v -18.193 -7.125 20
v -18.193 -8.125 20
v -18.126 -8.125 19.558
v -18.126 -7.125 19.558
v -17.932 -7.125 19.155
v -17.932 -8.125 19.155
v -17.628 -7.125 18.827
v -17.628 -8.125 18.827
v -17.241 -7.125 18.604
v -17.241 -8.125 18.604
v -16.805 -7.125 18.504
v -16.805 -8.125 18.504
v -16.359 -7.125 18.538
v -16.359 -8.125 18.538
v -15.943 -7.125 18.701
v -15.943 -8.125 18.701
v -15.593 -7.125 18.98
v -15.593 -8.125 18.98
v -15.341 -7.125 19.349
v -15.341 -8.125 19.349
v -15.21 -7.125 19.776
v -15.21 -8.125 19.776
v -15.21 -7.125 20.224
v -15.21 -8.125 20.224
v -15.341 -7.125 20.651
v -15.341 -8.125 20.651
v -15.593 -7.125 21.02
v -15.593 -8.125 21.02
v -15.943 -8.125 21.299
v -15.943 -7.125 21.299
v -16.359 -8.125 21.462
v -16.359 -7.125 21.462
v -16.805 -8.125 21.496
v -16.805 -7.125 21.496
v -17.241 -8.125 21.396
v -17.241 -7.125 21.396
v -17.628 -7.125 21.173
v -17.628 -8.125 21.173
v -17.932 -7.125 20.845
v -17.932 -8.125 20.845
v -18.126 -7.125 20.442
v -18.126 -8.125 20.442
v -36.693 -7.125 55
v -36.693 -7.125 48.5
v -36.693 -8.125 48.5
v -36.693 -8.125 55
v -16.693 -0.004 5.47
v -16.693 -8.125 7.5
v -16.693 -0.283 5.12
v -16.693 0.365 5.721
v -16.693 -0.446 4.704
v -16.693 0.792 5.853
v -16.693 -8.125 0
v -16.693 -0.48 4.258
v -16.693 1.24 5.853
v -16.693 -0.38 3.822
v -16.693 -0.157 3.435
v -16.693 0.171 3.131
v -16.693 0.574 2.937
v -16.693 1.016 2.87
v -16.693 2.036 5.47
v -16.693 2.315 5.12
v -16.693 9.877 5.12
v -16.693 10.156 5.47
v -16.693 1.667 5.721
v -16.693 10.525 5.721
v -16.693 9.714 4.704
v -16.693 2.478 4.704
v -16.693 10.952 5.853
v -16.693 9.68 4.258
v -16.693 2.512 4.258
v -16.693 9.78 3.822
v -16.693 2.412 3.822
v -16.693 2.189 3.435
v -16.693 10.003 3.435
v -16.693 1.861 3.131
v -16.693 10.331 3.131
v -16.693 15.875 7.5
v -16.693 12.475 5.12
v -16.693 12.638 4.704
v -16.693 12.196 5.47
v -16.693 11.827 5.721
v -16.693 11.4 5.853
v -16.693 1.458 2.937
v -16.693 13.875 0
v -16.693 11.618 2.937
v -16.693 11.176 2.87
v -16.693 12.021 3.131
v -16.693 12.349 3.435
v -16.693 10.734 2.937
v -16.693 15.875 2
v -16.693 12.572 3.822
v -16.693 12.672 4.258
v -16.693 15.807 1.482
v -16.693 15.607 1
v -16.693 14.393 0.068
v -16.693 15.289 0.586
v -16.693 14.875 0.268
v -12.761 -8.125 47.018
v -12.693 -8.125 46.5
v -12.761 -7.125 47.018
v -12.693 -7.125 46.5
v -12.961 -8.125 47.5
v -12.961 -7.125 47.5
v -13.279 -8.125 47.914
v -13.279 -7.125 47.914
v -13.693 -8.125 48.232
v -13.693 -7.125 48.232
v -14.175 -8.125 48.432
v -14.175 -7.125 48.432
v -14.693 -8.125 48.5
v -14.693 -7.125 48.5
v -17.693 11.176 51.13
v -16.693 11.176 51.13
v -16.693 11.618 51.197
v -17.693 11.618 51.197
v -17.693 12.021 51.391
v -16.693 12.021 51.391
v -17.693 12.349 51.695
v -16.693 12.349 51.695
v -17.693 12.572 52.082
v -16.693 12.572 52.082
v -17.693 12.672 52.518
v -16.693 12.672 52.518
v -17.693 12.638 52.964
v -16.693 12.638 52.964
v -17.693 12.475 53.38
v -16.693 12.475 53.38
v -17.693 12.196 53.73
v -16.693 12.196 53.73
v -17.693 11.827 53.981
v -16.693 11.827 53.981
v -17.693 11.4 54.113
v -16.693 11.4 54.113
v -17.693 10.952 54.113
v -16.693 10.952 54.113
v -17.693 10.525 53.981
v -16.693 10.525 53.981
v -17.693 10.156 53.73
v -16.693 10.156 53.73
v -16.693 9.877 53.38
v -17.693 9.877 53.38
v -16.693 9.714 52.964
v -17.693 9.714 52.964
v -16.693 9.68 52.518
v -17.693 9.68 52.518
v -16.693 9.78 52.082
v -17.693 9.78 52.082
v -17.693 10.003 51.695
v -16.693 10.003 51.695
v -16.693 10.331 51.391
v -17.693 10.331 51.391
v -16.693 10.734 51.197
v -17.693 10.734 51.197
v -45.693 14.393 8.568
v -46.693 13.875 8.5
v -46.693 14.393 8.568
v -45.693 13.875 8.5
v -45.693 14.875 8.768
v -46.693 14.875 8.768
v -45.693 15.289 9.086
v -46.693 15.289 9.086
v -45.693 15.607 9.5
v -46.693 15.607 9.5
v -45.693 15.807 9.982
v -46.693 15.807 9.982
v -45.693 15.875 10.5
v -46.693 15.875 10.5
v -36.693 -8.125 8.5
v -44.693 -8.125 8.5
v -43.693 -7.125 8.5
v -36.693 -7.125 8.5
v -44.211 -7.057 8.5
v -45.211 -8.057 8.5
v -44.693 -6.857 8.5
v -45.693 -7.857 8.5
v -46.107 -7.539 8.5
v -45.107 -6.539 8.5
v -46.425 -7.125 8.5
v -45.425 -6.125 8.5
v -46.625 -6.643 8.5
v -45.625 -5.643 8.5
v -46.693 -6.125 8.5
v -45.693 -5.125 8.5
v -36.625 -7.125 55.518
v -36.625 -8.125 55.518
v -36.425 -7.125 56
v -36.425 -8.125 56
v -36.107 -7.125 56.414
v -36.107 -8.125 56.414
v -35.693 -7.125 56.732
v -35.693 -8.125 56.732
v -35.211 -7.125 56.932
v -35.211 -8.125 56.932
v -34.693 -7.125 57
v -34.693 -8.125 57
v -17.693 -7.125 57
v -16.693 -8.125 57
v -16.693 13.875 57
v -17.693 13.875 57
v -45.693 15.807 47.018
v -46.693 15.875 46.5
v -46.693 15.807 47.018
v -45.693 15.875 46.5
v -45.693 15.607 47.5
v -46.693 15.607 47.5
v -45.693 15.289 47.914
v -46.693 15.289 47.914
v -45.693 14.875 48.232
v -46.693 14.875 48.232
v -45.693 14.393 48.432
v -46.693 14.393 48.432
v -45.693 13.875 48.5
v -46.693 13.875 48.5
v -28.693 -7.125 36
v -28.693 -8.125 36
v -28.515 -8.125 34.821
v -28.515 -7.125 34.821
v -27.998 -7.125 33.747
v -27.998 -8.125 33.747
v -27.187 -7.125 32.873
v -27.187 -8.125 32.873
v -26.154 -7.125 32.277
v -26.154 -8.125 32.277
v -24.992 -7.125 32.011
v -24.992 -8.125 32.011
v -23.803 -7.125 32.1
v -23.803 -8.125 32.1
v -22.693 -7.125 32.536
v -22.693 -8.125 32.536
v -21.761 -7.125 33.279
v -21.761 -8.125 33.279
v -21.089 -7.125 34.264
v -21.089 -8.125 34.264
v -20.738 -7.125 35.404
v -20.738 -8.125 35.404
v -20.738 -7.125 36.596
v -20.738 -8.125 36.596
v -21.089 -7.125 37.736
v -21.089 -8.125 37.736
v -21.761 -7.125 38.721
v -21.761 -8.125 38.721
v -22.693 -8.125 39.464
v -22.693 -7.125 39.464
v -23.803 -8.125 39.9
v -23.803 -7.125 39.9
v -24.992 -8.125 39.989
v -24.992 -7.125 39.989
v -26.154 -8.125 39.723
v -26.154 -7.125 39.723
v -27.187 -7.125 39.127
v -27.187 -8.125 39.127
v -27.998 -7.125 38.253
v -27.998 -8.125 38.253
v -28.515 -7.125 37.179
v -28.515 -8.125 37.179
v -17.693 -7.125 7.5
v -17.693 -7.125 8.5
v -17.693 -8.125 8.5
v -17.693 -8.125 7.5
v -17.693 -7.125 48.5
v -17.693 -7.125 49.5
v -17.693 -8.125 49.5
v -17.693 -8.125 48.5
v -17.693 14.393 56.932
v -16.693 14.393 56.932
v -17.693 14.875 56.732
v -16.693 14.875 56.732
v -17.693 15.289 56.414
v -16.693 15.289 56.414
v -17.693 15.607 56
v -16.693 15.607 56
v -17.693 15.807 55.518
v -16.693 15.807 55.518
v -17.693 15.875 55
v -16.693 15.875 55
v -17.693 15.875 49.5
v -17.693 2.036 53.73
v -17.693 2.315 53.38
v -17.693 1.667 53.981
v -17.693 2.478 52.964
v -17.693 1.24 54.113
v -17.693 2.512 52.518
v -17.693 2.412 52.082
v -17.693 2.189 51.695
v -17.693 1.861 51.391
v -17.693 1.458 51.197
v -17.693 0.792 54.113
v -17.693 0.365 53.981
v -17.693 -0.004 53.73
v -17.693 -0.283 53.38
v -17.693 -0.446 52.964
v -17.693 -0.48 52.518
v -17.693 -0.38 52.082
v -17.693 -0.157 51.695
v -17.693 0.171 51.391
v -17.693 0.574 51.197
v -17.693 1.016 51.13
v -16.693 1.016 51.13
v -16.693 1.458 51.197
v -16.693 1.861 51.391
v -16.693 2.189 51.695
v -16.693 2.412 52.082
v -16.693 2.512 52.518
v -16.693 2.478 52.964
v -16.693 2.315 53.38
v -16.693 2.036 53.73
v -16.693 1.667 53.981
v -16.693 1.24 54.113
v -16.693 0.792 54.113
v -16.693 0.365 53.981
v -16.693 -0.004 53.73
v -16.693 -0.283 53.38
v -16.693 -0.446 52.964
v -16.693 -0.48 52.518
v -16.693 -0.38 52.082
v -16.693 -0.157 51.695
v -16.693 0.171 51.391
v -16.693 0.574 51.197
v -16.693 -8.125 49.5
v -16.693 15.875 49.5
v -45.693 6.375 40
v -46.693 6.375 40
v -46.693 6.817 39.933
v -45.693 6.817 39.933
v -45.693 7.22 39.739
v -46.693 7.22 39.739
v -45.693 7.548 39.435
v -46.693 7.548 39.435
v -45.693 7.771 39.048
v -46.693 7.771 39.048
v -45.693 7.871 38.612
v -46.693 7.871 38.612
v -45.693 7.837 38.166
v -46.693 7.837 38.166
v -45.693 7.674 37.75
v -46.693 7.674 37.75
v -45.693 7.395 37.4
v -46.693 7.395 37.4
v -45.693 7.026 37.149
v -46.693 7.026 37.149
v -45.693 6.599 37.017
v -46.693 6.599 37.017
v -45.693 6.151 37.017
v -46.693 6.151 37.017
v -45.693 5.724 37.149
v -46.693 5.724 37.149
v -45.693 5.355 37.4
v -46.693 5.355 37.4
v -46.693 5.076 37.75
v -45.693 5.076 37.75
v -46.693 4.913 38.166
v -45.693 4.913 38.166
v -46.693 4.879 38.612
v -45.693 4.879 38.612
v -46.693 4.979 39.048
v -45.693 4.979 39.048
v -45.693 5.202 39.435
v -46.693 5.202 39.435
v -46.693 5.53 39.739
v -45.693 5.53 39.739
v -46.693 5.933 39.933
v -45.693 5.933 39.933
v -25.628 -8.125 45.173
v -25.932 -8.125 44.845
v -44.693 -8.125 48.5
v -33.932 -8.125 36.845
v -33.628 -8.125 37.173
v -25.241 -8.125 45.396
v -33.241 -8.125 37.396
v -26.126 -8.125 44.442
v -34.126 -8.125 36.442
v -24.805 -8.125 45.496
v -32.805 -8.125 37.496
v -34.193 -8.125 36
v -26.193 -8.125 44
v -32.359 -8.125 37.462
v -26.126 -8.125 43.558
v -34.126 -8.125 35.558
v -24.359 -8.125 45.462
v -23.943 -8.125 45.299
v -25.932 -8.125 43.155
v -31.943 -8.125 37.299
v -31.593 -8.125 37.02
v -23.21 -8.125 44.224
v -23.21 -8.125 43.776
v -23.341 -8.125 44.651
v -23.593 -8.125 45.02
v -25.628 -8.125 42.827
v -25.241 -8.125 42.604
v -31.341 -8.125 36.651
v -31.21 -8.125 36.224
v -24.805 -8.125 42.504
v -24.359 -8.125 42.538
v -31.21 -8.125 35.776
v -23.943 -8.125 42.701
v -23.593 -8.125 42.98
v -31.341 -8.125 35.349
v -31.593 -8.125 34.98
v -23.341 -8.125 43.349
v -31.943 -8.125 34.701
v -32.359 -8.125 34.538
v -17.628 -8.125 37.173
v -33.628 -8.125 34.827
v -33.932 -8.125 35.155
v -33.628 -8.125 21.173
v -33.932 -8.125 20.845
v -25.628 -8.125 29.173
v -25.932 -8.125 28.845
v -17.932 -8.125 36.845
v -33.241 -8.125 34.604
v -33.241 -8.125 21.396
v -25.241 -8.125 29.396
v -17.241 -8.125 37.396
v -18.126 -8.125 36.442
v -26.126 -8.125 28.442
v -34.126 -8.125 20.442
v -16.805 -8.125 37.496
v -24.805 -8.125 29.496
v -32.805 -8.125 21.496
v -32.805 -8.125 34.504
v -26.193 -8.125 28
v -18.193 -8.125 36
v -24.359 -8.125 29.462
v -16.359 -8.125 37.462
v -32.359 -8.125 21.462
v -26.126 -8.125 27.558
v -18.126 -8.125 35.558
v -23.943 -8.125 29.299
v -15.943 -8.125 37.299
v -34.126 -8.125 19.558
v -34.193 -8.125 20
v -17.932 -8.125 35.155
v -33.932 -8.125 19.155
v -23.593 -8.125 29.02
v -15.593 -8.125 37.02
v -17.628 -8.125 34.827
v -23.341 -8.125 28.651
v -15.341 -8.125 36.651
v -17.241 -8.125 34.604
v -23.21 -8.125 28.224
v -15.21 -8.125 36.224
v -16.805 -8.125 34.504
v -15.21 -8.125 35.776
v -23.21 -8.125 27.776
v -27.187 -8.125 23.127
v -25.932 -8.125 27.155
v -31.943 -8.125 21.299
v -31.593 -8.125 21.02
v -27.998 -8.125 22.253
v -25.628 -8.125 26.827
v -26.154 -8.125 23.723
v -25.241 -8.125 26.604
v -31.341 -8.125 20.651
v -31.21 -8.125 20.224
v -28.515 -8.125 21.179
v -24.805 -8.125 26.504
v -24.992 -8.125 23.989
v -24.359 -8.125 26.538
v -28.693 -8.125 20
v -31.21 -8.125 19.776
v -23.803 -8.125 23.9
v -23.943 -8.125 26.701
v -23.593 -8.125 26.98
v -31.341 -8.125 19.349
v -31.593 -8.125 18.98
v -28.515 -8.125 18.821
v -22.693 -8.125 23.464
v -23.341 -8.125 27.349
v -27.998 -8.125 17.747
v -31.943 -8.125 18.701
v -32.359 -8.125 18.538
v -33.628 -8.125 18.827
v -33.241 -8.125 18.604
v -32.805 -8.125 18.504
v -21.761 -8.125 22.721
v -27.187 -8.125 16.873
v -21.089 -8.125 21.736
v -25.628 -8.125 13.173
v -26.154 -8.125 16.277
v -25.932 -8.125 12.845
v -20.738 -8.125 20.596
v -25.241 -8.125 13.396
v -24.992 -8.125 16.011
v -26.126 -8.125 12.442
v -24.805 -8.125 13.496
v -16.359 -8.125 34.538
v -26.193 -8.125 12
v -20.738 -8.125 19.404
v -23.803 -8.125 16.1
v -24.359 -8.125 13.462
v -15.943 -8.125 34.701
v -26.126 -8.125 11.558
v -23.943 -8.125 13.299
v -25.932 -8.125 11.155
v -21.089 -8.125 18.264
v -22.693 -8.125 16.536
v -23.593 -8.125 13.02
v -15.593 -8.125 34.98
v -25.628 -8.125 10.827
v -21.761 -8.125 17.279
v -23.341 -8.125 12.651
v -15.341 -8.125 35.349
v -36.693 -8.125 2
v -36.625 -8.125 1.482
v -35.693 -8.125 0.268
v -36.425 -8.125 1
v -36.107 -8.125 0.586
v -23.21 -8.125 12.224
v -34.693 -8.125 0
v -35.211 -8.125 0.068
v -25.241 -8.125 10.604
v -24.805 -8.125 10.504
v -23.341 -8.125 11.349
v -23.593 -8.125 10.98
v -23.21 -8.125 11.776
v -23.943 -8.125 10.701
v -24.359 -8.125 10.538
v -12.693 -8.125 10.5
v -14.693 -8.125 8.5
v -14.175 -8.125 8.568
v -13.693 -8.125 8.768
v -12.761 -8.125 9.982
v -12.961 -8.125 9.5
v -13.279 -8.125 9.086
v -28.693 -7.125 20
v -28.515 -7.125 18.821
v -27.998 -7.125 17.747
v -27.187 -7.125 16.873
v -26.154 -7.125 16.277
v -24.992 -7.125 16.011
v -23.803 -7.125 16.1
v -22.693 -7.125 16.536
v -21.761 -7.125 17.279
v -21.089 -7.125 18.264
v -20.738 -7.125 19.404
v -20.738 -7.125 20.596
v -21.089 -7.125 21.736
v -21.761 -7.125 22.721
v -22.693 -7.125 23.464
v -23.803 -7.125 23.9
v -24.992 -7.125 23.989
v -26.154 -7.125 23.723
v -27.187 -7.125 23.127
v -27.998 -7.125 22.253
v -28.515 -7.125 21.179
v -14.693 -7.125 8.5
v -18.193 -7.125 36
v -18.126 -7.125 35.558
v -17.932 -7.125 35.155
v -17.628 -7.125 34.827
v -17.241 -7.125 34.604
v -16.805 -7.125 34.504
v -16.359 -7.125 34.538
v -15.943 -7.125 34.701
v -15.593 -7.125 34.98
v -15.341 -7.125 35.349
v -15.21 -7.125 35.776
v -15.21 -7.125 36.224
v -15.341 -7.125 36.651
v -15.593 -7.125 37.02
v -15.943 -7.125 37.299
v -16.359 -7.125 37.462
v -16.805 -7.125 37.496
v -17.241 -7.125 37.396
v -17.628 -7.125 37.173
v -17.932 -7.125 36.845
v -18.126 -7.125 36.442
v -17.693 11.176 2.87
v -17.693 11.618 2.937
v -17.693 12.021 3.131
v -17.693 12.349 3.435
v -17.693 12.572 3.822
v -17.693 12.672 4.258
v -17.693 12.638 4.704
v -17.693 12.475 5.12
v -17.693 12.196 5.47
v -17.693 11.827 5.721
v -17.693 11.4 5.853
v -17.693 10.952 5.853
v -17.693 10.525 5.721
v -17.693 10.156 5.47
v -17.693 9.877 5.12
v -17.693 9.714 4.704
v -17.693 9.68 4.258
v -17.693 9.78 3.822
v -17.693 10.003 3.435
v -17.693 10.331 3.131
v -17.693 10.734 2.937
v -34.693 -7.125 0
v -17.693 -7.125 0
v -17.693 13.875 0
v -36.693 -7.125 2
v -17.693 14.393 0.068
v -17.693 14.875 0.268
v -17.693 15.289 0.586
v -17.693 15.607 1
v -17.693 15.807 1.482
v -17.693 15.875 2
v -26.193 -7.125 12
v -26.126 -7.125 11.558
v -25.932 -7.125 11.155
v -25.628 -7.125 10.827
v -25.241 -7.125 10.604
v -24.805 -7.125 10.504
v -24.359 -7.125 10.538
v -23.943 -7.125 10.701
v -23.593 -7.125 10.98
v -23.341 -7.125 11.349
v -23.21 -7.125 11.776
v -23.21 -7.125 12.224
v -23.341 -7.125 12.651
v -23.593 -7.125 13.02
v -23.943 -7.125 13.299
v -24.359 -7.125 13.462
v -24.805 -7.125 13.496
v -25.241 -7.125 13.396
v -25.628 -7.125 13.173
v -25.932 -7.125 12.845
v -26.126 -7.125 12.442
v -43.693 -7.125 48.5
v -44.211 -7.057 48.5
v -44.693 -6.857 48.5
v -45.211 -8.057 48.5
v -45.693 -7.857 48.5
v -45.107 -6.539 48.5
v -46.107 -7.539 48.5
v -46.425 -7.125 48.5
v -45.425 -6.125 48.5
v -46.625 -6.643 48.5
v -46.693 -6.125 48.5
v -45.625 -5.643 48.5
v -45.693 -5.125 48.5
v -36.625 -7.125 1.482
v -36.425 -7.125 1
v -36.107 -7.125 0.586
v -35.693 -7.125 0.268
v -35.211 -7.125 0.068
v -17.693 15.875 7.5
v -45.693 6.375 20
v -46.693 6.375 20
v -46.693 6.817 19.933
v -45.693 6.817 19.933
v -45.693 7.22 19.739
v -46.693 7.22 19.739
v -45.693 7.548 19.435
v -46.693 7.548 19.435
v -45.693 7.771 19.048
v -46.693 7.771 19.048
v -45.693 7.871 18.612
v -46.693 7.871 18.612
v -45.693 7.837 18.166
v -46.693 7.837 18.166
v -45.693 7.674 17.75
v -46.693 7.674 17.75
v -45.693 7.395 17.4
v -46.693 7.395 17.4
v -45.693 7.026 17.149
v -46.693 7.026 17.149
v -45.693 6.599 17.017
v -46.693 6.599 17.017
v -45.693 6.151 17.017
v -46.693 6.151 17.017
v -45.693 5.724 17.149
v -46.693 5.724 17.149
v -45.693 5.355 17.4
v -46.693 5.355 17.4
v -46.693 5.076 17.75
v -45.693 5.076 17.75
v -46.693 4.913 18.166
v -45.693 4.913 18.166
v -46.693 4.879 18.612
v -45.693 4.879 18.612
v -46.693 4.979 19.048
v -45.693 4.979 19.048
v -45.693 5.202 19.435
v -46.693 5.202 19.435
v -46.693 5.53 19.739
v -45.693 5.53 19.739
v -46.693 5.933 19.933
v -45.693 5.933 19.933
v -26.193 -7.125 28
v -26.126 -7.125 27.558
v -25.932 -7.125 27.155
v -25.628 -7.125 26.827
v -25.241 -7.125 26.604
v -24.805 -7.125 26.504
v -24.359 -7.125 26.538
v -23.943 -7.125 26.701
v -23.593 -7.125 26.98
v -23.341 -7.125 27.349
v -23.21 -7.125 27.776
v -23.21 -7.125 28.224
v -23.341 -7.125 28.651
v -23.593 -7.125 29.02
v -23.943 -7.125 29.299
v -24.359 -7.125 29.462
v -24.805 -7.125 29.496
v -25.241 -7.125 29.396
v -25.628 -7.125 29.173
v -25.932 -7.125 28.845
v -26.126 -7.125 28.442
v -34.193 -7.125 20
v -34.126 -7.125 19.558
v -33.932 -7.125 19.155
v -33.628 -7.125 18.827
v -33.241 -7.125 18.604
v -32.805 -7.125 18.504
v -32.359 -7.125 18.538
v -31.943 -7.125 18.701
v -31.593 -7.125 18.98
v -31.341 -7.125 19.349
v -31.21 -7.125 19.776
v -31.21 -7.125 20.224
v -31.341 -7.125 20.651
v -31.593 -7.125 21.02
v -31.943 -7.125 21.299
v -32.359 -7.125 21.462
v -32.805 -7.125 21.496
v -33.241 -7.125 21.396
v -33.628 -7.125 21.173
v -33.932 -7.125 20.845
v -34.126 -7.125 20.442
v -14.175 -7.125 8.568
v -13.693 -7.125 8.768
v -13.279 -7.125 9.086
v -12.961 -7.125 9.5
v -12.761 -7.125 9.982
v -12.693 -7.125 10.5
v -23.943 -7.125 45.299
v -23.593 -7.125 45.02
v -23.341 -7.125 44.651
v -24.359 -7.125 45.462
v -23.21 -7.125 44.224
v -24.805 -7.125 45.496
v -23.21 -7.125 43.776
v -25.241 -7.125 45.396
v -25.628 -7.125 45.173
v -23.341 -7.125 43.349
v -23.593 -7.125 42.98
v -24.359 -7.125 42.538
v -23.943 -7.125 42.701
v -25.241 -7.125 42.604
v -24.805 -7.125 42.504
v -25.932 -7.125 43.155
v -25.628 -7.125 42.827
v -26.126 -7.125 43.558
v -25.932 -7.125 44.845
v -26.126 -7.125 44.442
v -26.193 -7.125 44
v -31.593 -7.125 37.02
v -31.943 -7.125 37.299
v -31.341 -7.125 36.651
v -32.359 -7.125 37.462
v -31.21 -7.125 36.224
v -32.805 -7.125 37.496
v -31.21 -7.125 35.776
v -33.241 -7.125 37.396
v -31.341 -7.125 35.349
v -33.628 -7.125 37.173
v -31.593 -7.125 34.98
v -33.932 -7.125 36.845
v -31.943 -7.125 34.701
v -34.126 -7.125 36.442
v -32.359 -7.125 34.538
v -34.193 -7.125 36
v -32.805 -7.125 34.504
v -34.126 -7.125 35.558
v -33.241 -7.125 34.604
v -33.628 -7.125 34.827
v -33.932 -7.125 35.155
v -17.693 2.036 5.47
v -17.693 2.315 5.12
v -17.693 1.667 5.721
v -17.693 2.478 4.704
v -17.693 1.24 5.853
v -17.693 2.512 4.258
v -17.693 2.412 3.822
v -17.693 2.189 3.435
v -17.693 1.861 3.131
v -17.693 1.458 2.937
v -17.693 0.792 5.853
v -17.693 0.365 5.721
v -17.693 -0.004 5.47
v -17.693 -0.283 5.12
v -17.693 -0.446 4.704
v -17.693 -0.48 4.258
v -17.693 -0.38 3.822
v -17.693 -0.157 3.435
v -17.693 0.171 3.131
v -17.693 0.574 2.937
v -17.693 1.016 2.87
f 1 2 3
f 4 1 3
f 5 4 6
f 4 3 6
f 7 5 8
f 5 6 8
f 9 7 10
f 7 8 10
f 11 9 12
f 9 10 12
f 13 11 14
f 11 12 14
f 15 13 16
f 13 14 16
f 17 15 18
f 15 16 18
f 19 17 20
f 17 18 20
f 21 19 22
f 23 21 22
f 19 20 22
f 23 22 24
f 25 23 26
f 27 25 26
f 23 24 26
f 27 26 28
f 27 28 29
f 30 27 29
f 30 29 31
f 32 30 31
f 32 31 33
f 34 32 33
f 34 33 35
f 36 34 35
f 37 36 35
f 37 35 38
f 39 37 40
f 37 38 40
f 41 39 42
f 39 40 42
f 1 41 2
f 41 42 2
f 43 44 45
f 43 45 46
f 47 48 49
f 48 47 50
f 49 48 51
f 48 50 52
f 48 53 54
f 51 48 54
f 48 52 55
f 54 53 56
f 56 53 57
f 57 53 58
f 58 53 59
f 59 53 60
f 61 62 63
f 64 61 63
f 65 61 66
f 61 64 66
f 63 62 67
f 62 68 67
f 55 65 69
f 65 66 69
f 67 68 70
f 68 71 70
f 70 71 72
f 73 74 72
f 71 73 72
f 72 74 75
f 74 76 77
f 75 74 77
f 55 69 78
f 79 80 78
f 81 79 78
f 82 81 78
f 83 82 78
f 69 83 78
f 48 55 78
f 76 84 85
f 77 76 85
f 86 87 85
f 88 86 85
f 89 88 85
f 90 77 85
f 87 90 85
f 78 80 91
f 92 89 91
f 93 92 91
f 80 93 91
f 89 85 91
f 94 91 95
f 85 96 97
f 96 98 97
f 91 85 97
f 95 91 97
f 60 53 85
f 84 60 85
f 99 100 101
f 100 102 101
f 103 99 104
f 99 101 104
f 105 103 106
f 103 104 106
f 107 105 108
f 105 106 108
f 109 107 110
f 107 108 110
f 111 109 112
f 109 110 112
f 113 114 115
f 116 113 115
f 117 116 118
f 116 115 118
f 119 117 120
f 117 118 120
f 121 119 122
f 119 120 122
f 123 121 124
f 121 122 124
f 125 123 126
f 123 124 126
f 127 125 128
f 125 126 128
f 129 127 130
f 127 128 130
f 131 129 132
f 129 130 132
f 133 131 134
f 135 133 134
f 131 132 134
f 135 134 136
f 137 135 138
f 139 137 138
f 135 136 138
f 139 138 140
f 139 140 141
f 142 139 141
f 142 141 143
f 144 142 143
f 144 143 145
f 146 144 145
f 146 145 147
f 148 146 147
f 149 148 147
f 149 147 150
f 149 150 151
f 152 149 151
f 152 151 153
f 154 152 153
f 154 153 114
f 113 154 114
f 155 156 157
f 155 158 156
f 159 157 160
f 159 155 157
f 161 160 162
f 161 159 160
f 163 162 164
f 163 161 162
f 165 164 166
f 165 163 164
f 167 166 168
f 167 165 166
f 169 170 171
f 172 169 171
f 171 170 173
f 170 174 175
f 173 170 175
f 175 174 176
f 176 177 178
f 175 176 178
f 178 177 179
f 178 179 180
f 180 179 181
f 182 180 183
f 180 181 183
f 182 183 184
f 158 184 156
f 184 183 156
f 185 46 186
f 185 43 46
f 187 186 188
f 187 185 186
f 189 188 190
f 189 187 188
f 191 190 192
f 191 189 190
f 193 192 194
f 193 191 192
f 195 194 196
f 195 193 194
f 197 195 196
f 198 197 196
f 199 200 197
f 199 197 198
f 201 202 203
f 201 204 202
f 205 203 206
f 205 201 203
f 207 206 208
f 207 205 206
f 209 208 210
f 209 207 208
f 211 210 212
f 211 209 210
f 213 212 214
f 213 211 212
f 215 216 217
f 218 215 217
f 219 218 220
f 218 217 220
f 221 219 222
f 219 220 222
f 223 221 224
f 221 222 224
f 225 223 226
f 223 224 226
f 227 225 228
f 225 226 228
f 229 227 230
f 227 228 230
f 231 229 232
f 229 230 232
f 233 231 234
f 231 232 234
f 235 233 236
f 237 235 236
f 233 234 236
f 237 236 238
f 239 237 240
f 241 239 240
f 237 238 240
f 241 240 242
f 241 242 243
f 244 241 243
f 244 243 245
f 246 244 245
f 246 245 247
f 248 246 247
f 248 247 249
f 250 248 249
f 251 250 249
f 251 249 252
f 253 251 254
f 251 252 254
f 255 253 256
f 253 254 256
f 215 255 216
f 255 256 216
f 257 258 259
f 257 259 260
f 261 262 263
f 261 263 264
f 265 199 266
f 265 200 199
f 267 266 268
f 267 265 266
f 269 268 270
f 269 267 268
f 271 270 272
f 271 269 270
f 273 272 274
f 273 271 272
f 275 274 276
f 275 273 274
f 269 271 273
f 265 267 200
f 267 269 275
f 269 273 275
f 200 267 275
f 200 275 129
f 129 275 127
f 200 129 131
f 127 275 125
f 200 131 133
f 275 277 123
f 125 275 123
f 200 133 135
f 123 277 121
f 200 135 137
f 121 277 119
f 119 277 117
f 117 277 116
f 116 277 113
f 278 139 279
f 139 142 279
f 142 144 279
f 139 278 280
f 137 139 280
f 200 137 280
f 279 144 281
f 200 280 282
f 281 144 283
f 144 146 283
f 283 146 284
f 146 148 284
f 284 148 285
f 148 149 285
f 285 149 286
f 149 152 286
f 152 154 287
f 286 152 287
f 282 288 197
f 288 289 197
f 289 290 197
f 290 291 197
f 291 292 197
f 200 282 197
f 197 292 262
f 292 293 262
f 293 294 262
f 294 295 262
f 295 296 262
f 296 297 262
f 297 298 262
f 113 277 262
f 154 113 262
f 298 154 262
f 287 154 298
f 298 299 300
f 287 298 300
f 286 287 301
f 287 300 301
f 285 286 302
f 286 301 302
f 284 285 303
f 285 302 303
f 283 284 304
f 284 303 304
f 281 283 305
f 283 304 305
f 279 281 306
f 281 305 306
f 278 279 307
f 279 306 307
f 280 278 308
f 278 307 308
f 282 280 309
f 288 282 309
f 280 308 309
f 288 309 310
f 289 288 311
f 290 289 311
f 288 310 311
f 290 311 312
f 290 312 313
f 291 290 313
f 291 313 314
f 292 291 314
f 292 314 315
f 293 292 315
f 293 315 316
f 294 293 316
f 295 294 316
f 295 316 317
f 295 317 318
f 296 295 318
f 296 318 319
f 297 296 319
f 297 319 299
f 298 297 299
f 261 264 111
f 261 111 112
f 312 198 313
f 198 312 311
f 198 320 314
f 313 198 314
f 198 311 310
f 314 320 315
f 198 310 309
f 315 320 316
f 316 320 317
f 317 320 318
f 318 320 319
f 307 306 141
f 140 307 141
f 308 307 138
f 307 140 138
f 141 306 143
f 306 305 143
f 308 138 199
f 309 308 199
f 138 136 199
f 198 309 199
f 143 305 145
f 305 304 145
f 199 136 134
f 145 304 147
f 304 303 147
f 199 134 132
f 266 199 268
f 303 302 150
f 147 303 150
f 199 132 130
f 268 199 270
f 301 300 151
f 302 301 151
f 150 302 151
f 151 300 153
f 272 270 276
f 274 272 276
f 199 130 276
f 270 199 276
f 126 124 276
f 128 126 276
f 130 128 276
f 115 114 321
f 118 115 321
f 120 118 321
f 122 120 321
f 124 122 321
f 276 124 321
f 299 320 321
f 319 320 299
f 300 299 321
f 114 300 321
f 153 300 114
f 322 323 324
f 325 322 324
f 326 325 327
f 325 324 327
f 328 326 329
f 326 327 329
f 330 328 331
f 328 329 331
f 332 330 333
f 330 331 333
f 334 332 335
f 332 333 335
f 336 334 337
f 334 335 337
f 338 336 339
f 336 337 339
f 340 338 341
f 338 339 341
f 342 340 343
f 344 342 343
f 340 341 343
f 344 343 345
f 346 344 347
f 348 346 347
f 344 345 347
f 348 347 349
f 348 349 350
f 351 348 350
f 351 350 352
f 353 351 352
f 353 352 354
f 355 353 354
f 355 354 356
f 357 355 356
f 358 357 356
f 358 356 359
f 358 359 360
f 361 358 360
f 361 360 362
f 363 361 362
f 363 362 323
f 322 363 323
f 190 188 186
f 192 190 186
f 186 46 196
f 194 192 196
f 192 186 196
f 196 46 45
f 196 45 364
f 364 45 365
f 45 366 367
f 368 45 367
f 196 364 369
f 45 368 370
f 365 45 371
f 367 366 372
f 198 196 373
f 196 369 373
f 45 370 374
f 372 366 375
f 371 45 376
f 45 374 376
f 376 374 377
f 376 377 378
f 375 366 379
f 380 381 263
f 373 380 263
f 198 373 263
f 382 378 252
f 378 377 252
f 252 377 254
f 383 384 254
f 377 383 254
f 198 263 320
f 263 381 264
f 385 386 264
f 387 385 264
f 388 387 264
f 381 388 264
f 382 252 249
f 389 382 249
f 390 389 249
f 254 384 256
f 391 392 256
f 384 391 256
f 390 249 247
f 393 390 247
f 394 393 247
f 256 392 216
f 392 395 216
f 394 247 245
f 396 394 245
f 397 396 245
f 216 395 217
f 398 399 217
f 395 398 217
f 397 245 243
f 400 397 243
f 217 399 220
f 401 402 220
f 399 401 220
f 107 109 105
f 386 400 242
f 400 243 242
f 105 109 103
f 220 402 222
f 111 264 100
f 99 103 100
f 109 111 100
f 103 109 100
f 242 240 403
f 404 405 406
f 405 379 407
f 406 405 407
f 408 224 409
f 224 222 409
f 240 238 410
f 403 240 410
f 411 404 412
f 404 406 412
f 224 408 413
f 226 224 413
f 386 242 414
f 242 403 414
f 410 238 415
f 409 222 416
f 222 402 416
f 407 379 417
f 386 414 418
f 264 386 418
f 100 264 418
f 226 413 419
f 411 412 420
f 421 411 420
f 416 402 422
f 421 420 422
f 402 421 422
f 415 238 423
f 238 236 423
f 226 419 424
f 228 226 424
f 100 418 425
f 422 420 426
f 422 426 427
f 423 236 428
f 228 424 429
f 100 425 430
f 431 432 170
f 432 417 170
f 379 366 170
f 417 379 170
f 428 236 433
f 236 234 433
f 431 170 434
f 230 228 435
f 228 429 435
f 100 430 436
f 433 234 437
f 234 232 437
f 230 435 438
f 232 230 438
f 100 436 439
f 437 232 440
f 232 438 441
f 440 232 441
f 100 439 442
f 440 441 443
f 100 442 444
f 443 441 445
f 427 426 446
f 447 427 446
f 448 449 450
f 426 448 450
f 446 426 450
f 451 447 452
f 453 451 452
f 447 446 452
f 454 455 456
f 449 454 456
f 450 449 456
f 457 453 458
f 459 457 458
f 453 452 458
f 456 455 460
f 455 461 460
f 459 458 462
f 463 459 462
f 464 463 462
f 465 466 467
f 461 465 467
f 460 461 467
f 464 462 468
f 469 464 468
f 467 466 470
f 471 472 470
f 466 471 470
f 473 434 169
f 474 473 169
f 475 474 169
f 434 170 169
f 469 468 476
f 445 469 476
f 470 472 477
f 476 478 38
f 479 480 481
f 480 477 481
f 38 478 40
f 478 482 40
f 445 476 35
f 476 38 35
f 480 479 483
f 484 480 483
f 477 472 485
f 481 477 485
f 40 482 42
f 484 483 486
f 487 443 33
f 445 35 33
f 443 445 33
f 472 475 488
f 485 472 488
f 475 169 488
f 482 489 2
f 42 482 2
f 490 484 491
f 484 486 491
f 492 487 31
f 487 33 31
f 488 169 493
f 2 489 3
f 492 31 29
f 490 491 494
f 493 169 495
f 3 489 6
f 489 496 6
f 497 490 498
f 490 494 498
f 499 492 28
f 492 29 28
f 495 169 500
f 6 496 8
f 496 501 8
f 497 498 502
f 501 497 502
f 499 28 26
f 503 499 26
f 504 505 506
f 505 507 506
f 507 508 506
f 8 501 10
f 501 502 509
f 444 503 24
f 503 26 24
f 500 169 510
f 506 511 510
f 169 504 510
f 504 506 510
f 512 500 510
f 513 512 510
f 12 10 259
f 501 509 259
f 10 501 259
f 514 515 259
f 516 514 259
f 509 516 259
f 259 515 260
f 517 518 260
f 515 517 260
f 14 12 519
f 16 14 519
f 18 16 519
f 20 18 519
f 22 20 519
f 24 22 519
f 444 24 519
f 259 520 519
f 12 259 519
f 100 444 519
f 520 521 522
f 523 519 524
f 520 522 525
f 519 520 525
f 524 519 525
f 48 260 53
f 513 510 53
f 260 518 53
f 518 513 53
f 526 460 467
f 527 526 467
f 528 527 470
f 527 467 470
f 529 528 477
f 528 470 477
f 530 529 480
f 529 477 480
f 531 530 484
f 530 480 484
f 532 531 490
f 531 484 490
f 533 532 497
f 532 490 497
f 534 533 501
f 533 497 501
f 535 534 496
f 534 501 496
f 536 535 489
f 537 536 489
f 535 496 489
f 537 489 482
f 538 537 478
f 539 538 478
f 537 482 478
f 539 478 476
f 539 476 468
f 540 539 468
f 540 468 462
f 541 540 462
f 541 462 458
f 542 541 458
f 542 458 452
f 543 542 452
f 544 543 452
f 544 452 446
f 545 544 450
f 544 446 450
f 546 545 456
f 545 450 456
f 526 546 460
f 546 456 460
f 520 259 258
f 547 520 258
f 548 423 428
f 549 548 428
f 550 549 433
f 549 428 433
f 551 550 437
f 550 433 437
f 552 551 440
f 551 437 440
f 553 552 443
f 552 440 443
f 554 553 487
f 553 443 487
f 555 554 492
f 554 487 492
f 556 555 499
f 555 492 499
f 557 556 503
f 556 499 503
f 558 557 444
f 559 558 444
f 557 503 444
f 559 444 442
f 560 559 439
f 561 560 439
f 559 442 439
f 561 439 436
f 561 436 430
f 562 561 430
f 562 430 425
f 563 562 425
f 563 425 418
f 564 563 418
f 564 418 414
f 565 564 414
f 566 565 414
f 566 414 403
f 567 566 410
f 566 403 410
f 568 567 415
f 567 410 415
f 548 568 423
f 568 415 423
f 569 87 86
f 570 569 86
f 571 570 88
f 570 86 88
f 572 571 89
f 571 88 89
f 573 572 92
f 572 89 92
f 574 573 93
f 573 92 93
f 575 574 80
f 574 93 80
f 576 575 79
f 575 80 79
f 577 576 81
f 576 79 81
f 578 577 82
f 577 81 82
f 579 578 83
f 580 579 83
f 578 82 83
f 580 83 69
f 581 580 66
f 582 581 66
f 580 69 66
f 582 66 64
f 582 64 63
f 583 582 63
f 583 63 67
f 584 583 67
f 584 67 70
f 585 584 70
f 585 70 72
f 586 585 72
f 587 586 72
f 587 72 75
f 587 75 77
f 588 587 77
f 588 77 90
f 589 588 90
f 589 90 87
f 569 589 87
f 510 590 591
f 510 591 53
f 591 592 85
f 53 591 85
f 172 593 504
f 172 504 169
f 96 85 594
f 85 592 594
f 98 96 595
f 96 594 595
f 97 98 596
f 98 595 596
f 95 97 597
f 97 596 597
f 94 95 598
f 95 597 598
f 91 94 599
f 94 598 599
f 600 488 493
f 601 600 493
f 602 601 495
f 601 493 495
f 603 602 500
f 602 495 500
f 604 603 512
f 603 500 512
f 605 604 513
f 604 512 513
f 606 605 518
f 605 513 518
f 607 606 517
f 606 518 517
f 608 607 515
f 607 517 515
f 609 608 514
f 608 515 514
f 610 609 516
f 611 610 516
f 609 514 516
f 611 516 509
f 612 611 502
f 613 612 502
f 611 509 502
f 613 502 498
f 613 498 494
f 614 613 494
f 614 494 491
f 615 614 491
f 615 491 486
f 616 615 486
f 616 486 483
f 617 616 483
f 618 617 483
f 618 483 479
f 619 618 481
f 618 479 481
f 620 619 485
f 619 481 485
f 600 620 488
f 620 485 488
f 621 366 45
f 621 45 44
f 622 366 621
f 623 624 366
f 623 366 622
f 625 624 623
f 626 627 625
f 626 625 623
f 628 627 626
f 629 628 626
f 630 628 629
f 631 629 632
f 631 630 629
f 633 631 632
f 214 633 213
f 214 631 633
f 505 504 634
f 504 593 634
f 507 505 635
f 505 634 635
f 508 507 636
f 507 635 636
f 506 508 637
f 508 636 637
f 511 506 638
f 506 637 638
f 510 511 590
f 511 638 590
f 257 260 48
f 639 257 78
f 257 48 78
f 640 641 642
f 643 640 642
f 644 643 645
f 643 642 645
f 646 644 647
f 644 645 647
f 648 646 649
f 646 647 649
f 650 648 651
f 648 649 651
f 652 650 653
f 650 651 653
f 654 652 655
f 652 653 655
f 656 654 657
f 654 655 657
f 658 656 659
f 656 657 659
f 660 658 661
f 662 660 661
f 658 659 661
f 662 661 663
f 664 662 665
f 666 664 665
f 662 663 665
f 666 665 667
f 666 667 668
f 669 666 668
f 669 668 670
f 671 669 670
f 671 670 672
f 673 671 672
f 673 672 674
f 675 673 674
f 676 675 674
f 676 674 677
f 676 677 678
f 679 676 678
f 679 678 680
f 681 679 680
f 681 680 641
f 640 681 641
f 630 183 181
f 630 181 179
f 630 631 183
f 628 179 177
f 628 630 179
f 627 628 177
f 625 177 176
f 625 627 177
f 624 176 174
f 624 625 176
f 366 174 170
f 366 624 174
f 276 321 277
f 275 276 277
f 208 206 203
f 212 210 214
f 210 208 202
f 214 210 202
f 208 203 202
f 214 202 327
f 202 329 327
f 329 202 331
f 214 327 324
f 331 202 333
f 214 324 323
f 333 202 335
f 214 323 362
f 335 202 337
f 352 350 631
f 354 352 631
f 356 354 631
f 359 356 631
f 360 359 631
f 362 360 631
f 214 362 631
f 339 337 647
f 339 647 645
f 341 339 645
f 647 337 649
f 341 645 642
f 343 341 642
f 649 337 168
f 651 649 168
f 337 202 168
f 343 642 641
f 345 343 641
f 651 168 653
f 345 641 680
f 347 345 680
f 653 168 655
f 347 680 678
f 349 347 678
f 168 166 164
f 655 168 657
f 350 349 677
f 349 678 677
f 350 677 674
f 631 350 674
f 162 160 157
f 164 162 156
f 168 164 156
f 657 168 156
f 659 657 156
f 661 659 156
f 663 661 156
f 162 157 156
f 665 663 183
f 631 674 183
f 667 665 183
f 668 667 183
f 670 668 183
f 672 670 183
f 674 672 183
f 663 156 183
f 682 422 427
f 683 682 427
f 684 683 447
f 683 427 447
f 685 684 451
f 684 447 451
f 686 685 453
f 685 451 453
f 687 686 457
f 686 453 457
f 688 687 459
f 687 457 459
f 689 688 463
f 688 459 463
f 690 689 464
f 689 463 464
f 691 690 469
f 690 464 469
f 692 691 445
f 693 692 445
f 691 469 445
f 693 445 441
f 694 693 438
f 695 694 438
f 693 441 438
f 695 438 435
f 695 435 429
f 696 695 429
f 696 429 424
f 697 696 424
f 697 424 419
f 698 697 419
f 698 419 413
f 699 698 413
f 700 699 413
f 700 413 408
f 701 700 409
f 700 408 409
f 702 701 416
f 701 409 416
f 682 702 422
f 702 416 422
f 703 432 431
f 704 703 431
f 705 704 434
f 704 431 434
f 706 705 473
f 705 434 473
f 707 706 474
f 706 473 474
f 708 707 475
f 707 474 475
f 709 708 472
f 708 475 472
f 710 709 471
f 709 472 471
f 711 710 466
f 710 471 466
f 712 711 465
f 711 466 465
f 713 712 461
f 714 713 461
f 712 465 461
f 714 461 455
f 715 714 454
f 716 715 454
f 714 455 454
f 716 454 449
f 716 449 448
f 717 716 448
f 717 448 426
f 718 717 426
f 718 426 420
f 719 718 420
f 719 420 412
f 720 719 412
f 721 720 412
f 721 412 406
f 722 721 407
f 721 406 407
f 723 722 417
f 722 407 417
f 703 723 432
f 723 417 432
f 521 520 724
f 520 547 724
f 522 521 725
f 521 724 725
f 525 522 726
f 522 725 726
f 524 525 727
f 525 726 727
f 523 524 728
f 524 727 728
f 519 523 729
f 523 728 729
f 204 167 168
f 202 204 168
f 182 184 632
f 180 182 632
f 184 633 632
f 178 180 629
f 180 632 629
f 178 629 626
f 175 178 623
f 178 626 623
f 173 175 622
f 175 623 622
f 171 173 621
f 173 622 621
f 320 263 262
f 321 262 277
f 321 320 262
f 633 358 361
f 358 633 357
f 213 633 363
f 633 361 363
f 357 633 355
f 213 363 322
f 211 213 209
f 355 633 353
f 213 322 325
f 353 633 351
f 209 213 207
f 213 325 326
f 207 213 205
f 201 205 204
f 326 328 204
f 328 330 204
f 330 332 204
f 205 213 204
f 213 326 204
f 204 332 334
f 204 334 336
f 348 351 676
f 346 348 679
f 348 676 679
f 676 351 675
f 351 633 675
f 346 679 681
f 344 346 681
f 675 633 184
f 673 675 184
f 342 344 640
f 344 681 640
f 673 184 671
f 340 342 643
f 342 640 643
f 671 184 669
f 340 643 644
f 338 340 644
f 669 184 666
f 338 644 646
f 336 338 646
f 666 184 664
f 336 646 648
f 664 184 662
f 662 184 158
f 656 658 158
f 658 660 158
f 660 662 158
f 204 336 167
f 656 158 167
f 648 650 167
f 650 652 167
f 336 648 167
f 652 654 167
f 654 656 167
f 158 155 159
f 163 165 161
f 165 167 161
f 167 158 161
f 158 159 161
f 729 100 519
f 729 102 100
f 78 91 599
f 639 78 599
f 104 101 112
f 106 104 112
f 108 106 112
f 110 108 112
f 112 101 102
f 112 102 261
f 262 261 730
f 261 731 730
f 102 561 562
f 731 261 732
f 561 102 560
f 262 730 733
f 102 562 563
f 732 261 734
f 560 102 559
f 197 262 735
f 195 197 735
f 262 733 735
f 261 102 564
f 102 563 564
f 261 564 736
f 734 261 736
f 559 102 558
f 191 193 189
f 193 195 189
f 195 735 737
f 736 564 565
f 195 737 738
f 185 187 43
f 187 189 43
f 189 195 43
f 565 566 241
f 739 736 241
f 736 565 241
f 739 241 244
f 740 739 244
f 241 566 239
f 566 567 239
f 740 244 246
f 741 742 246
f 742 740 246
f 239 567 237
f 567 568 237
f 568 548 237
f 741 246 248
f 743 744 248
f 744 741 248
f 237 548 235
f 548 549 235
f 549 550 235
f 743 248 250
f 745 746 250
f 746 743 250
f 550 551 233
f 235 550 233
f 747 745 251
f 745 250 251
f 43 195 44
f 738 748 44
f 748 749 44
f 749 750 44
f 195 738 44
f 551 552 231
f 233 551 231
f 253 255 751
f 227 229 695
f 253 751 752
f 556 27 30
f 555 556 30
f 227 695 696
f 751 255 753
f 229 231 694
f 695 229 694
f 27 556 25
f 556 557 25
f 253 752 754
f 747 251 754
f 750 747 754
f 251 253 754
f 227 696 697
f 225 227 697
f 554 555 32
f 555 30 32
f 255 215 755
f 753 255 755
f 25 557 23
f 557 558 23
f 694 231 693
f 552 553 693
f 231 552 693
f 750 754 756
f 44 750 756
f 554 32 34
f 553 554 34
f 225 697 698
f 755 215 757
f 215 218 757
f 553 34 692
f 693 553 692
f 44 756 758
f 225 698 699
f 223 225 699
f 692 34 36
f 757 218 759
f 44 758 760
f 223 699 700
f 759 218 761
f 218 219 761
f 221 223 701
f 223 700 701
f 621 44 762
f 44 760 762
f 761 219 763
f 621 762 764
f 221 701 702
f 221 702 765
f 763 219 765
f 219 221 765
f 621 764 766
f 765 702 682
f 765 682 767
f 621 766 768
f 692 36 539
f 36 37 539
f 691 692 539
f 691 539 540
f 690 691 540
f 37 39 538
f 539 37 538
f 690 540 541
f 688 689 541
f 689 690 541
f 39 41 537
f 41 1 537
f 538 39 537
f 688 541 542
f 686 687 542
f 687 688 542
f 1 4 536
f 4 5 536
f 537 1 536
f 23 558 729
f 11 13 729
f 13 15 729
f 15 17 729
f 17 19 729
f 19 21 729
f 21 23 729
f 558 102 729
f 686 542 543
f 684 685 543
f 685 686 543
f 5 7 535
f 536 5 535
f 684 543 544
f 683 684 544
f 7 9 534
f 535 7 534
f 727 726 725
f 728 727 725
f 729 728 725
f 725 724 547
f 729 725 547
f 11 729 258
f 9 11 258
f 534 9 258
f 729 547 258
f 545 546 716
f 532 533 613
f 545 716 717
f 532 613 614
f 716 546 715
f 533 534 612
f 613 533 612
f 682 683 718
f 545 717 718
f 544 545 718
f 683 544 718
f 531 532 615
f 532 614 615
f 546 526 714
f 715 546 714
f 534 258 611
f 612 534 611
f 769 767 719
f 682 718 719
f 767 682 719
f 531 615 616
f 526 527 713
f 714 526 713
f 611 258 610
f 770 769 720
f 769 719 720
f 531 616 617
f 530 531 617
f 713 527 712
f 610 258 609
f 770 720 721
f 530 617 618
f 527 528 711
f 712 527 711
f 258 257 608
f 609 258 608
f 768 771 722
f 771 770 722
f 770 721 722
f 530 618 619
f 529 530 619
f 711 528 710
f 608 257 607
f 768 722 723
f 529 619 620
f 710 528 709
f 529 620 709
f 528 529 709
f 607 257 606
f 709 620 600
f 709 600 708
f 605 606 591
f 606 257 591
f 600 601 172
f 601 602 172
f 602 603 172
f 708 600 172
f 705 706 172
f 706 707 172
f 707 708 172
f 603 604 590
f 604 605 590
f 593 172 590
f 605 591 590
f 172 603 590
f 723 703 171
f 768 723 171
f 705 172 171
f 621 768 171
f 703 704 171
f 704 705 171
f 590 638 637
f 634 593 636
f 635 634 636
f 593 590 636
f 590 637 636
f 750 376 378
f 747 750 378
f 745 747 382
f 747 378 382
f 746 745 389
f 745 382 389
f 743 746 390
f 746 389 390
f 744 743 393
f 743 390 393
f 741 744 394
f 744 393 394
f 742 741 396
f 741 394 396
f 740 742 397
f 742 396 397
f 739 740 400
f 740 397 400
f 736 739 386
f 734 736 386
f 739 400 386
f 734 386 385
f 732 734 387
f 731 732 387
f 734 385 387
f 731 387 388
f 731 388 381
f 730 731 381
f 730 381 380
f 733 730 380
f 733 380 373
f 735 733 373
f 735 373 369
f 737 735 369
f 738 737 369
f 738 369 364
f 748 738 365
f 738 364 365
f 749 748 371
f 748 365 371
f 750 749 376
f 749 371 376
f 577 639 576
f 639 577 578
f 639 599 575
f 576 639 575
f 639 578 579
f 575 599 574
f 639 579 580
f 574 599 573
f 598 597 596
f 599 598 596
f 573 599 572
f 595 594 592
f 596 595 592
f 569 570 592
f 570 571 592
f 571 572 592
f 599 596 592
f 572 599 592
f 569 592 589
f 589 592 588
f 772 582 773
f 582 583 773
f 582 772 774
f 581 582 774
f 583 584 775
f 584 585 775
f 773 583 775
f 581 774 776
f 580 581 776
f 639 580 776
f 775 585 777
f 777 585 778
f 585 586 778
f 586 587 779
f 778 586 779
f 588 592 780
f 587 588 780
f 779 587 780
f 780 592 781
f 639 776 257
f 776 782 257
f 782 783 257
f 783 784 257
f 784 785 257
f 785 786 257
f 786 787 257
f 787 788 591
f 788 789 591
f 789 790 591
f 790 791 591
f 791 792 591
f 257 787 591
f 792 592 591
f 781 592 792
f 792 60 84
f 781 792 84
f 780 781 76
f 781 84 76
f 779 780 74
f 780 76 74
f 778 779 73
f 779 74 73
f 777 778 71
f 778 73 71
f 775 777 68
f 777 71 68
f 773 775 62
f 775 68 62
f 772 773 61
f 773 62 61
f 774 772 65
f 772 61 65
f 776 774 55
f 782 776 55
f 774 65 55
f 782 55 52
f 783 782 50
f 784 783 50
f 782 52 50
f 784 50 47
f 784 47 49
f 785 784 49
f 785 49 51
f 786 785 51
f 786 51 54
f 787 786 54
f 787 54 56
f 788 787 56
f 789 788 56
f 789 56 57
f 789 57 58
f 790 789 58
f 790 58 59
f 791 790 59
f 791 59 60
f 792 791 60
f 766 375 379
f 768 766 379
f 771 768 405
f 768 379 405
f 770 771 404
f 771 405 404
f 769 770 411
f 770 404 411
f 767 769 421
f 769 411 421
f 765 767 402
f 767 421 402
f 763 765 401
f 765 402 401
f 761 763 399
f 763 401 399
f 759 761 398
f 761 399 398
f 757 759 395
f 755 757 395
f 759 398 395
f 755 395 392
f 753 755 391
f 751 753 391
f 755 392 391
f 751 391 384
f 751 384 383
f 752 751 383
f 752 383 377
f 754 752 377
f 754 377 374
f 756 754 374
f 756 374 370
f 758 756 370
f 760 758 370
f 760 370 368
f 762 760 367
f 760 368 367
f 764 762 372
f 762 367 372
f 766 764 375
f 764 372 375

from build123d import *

# Parameters (mm, degrees)
BOSS_EXTRUDE1_DEPTH = 57
SKETCH2_W           = 42
SKETCH2_H           = 24
CUT_EXTRUDE1_DEPTH  = 1
SKETCH3_R           = 1.5
CUT_EXTRUDE2_DEPTH  = 2.54
SKETCH4_W           = 8.5
SKETCH4_H           = 24
CUT_EXTRUDE3_DEPTH  = 10
SKETCH5_R           = 1.5
CUT_EXTRUDE4_DEPTH  = 10
SKETCH6_W           = 40
SKETCH6_H           = 1
BOSS_EXTRUDE2_DEPTH = 5
SKETCH7_R           = 4
SKETCH7_R_2         = 1.5
CUT_EXTRUDE5_DEPTH  = 1
FILLET1_R           = 2


with BuildPart() as part:
    # Sketch1 → Boss-Extrude1 (new body)
    with BuildSketch(Plane.XY):
        Polygon((-46.692941858, 15.875), (-46.692941858, -8.125), (-16.692941858, -8.125), (-16.692941858, 15.875), (-17.692941858, 15.875), (-17.692941858, -7.125), (-45.692941858, -7.125), (-45.692941858, 15.875), align=None)
    extrude(amount=BOSS_EXTRUDE1_DEPTH)

    # Sketch2 → Cut-Extrude1 (cut)
    with BuildSketch(Plane(origin=(-16.692941858, 0, 0), x_dir=(0, 0, -1), z_dir=(1, 0, 0))):
        with Locations((-28.5, 3.875)):
            Rectangle(SKETCH2_W, SKETCH2_H)
    extrude(amount=-CUT_EXTRUDE1_DEPTH, mode=Mode.SUBTRACT)

    # Sketch3 → Cut-Extrude2 (cut)
    with BuildSketch(Plane(origin=(-16.692941858, 0, 0), x_dir=(0, 0, -1), z_dir=(1, 0, 0))):
        with Locations((-52.63, 11.176)):
            Circle(SKETCH3_R)
        with Locations((-4.37, 11.176)):
            Circle(SKETCH3_R)
        with Locations((-4.37, 1.016)):
            Circle(SKETCH3_R)
        with Locations((-52.63, 1.016)):
            Circle(SKETCH3_R)
    extrude(amount=-CUT_EXTRUDE2_DEPTH, mode=Mode.SUBTRACT)

    # Sketch4 → Cut-Extrude3 (cut)
    with BuildSketch(Plane.ZY.offset(46.692941858)):
        with Locations((4.25, 3.875)):
            Rectangle(SKETCH4_W, SKETCH4_H)
        with Locations((52.75, 3.875)):
            Rectangle(SKETCH4_W, SKETCH4_H)
    extrude(amount=-CUT_EXTRUDE3_DEPTH, mode=Mode.SUBTRACT)

    # Sketch5 → Cut-Extrude4 (cut)
    with BuildSketch(Plane.ZY.offset(46.692941858)):
        with Locations((38.5, 6.375)):
            Circle(SKETCH5_R)
        with Locations((18.5, 6.375)):
            Circle(SKETCH5_R)
    extrude(amount=-CUT_EXTRUDE4_DEPTH, mode=Mode.SUBTRACT)

    # Sketch6 → Boss-Extrude2 (add)
    with BuildSketch(Plane(origin=(-17.692941858, 0, 0), x_dir=(0, 0, -1), z_dir=(1, 0, 0))):
        with Locations((-28.5, -7.625)):
            Rectangle(SKETCH6_W, SKETCH6_H)
    extrude(amount=BOSS_EXTRUDE2_DEPTH)

    # Sketch7 → Cut-Extrude5 (cut)
    with BuildSketch(Plane(origin=(0, -8.125, 0), x_dir=(-1, 0, 0), z_dir=(0, -1, 0))):
        with Locations((24.692941858, -20)):
            Circle(SKETCH7_R)
        with Locations((24.692941858, -12)):
            Circle(SKETCH7_R_2)
        with Locations((32.692941858, -20)):
            Circle(SKETCH7_R_2)
        with Locations((24.692941858, -28)):
            Circle(SKETCH7_R_2)
        with Locations((16.692941858, -20)):
            Circle(SKETCH7_R_2)
        with Locations((32.692941858, -36)):
            Circle(SKETCH7_R_2)
        with Locations((24.692941858, -44)):
            Circle(SKETCH7_R_2)
        with Locations((16.692941858, -36)):
            Circle(SKETCH7_R_2)
        with Locations((24.692941858, -36)):
            Circle(SKETCH7_R)
    extrude(amount=-CUT_EXTRUDE5_DEPTH, mode=Mode.SUBTRACT)

    # Fillet1
    fillet1_edges = [part.edges().sort_by_distance(p)[0] for p in [
        (-12.692941858, -7.625, 8.5),
        (-12.692941858, -7.625, 48.5),
        (-17.192941858, 15.875, 57),
        (-36.692941858, -7.625, 0),
        (-46.192941858, 15.875, 8.5),
        (-45.692941858, -7.125, 28.5),
        (-46.692941858, -8.125, 28.5),
        (-36.692941858, -7.625, 57),
        (-17.192941858, 15.875, 0),
        (-46.192941858, 15.875, 48.5),
    ]]
    fillet(fillet1_edges, radius=FILLET1_R)


solid = part.part
